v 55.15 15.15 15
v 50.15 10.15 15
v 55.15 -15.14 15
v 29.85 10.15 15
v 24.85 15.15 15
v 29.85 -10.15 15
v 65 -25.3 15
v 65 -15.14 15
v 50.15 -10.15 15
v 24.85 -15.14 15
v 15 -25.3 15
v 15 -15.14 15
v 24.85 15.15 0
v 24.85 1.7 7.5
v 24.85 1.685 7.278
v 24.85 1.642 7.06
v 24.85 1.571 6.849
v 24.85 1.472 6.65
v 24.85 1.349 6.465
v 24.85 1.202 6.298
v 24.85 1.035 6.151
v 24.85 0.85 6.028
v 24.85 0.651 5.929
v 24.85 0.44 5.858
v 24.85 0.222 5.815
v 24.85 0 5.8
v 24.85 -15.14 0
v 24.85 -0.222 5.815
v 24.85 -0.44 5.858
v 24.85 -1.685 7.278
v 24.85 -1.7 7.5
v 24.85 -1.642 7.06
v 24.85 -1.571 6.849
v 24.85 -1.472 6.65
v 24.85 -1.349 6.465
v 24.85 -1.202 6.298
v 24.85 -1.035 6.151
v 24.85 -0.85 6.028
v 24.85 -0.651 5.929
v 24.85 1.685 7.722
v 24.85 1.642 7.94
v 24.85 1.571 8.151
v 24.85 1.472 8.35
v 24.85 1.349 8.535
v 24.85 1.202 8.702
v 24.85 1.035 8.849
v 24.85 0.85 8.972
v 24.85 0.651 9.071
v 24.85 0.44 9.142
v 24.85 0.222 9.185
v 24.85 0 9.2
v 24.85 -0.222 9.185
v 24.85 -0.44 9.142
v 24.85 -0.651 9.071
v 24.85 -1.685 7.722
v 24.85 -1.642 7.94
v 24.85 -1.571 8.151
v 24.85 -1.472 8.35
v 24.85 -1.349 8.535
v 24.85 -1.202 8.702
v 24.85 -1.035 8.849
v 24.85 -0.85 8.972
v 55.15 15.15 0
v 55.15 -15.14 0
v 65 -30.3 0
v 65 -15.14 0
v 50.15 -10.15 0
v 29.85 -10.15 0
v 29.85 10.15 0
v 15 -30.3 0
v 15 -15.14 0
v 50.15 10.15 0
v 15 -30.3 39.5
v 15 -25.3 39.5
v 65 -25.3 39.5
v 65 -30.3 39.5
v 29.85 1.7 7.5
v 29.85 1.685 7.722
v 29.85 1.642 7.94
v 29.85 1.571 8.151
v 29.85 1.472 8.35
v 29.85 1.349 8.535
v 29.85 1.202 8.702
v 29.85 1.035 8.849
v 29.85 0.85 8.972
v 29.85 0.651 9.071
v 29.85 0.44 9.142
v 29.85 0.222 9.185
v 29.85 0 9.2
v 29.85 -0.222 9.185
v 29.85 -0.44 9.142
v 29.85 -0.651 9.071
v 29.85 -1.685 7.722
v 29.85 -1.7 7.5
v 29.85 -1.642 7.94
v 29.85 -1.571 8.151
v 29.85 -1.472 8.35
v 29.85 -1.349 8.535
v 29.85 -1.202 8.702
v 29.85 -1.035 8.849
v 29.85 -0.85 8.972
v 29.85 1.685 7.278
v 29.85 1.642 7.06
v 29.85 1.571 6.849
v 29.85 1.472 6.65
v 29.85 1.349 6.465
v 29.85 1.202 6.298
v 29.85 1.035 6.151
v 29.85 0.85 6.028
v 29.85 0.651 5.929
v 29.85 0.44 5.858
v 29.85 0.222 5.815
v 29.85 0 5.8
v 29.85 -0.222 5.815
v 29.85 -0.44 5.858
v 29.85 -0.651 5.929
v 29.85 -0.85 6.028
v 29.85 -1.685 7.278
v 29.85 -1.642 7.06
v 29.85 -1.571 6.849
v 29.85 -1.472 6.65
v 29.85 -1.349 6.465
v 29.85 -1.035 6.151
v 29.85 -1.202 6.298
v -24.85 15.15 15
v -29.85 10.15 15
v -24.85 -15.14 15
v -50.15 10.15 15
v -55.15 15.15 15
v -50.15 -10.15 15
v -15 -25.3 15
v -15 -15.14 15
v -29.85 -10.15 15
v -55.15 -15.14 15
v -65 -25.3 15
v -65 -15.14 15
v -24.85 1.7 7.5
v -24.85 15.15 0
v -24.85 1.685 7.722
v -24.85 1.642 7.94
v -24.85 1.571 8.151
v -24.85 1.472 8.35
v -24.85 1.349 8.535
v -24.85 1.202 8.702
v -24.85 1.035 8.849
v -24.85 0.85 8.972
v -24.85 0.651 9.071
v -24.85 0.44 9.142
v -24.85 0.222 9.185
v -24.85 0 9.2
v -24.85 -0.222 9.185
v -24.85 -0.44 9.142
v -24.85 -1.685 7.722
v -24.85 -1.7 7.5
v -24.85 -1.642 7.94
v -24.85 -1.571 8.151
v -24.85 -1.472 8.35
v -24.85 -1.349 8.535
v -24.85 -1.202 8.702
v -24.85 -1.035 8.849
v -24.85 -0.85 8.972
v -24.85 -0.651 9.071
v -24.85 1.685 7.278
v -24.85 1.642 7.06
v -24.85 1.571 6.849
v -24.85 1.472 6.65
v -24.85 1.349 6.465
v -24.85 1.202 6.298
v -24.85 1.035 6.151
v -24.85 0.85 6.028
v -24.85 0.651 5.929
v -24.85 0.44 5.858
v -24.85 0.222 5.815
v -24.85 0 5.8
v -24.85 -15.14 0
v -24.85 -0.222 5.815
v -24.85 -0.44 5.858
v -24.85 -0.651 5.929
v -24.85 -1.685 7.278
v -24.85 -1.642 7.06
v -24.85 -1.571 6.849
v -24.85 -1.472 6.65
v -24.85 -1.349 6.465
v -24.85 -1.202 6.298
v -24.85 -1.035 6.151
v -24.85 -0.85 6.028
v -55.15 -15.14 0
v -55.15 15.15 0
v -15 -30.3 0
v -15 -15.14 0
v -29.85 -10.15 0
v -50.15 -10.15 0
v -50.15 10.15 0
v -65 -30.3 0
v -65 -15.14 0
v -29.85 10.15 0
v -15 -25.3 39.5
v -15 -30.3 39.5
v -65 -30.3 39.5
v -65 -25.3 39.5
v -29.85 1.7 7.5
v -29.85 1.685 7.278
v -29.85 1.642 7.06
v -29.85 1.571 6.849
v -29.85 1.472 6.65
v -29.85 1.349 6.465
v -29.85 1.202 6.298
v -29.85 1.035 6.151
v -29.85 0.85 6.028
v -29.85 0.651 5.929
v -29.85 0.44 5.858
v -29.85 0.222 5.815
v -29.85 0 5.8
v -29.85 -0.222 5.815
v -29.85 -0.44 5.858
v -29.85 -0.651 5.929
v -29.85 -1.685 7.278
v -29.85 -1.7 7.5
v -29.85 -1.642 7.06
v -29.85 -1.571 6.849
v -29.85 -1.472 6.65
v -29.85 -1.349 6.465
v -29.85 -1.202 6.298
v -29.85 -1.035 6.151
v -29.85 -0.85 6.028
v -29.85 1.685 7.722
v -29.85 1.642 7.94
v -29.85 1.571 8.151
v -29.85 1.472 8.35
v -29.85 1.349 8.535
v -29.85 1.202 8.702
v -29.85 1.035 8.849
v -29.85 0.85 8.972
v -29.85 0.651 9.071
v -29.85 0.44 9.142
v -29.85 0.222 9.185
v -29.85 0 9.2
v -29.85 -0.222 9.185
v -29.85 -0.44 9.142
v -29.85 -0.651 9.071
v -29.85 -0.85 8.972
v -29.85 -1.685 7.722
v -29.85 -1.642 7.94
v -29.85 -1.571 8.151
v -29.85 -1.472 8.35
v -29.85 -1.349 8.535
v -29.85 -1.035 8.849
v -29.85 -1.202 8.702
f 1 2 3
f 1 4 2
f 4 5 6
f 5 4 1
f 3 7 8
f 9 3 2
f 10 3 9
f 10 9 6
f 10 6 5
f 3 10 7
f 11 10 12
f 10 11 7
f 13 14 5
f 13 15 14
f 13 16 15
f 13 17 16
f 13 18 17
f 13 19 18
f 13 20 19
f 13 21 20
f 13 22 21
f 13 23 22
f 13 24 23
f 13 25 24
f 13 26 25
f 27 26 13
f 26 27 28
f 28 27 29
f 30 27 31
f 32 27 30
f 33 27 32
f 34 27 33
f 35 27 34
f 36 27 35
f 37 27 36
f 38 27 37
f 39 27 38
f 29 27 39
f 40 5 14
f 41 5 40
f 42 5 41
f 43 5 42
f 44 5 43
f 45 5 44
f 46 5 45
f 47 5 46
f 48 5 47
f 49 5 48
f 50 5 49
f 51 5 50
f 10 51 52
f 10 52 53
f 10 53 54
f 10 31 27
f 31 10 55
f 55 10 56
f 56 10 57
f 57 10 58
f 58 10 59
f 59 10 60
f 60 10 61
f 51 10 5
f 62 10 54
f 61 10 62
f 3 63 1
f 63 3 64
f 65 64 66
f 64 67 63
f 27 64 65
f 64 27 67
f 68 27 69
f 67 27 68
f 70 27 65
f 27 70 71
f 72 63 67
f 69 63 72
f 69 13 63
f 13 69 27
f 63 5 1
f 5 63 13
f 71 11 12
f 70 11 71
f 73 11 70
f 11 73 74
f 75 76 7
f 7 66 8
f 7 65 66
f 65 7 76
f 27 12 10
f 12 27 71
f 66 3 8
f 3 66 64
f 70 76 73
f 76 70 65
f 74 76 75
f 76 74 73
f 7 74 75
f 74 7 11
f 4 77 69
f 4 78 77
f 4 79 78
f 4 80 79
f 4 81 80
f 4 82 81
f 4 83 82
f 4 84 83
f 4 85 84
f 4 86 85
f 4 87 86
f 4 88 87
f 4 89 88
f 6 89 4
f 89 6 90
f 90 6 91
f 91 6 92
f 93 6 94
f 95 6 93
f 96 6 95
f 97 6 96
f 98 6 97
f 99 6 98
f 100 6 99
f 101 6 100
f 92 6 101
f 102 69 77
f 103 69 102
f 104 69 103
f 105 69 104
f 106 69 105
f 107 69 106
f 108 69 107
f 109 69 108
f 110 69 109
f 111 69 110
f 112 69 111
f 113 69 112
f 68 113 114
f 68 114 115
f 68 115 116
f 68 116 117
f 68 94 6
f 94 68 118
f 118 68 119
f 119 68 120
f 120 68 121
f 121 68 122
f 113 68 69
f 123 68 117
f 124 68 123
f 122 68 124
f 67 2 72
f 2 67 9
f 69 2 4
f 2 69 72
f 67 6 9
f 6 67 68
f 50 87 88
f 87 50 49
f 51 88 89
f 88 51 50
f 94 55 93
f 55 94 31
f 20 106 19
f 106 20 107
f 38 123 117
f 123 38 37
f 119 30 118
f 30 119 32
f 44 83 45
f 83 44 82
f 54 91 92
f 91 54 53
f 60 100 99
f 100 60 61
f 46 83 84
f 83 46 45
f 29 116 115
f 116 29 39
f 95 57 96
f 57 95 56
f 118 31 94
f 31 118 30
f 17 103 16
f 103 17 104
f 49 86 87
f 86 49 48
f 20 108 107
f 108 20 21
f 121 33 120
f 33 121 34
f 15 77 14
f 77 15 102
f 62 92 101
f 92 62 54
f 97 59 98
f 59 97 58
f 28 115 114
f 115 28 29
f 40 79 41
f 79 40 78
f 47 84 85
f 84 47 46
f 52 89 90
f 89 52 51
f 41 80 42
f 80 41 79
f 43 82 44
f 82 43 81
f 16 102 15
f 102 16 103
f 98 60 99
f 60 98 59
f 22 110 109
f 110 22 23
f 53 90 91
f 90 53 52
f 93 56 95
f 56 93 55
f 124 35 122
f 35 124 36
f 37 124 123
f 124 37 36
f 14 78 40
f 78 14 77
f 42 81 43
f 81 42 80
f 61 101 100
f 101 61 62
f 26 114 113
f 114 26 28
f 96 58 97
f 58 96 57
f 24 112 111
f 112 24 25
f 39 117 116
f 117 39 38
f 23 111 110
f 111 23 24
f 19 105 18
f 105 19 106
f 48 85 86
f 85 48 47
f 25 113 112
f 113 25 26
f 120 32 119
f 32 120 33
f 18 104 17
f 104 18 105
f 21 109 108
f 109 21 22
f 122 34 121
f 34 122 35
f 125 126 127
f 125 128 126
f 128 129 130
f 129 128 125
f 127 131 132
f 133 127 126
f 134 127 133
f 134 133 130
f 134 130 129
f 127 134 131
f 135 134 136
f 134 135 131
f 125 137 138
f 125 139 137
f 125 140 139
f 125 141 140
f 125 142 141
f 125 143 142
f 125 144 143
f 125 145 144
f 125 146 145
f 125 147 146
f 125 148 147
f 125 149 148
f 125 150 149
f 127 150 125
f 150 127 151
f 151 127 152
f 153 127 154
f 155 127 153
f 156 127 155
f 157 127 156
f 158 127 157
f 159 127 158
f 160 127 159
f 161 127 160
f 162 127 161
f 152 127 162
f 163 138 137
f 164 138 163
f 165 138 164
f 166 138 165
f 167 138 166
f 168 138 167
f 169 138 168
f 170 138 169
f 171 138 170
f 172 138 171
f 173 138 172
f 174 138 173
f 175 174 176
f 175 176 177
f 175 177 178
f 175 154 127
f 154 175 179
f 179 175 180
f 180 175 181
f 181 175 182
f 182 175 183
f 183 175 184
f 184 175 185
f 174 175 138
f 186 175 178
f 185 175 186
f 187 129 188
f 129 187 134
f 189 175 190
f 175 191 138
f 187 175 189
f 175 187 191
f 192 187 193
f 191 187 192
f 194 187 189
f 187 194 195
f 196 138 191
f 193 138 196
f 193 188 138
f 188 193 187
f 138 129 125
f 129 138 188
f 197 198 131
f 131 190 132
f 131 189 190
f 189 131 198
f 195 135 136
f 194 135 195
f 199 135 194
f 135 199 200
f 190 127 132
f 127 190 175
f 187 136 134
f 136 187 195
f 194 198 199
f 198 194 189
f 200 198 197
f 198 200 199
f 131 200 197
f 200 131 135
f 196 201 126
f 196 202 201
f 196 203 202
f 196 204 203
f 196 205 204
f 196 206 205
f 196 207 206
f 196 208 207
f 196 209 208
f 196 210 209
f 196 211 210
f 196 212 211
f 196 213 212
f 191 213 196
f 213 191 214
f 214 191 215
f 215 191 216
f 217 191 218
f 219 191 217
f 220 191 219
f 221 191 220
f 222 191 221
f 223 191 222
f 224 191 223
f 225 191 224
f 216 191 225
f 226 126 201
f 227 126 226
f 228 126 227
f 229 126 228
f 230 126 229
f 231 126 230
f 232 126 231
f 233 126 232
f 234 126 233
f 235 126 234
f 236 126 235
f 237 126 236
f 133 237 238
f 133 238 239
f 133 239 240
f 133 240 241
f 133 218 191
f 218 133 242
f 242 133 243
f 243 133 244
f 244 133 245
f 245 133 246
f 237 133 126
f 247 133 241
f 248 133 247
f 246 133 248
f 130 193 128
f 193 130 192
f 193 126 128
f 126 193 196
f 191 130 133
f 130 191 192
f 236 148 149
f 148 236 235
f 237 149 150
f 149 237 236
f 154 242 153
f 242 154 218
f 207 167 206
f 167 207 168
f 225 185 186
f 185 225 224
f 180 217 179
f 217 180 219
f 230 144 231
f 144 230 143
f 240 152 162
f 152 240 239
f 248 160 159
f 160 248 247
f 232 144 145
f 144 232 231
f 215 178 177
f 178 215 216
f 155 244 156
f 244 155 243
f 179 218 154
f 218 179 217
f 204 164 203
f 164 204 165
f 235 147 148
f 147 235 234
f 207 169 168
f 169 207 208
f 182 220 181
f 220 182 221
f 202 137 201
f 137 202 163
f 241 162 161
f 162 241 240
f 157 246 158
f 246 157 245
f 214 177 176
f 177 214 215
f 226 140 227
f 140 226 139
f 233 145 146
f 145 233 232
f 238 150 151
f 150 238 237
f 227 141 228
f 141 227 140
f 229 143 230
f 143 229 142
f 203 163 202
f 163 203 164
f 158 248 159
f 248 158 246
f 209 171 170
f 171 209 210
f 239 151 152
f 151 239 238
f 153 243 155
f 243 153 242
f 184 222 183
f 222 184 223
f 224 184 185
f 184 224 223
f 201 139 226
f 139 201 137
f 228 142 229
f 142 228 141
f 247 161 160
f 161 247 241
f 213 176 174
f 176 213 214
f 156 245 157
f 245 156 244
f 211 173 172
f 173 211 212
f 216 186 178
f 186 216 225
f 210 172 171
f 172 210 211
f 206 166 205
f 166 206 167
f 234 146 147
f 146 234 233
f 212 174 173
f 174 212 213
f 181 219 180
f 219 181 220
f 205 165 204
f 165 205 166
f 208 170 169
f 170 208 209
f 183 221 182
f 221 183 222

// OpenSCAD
// Back rail collar for the bench scope gantry (print one of each hand)
// An open sleeve that slips over the end of the back rail, flush with the end, so the rail still
// seats directly on the gusset. A tall wing wraps onto the upright's BACK face and stops the rail
// rotating around its single 1/4-20 bolt. One M3x10 + T-nut through the top pins it to the rail.
//
// Frame: X along the rail (X=0 is the rail's end, +X is into the upright), Y toward you, Z up.
// Origin: rail centerline = bolt centerline.

/* [Measure these] */
bolt_to_back = 25;    // bolt center to the upright's back face, measured
gusset_t     = 2.5;   // thickness of the gusset between the rail end and the upright, measured

/* [Collar] */
rail        = 20;
fit         = 0.3;    // total clearance on the rail
wall        = 5;      // 5 mm top wall: M3x10 reaches 5 mm into the T-nut
collar_len  = 15;

/* [Wing] */
wing_t      = 5;
wing_half_h = 25;     // above and below the bolt
wrap        = 22;     // how far the wing runs along the upright's back face
back_clear  = 0.3;    // gap between wing and upright

m3_clear = 3.4;
$fn = 48; eps = 0.01;

inner  = rail + fit;
c_half = inner/2 + wall;
y_wing1 = -(bolt_to_back + back_clear);   // wing face that touches the upright
y_wing0 = y_wing1 - wing_t;

module collar(hand = 1) {
  mirror([hand < 0 ? 1 : 0, 0, 0]) difference() {
    union() {
      translate([-collar_len, -c_half, -c_half]) cube([collar_len, 2*c_half, 2*c_half]);                 // sleeve
      translate([-collar_len, y_wing0, -wing_half_h]) cube([collar_len, -c_half - y_wing0 + eps, 2*wing_half_h]);   // web behind the sleeve
      translate([-collar_len, y_wing0, -wing_half_h]) cube([collar_len + gusset_t + wrap, wing_t, 2*wing_half_h]);  // wing
    }
    translate([-collar_len - eps, -inner/2, -inner/2]) cube([collar_len + 2*eps, inner, inner]);          // rail
    translate([-collar_len/2, 0, inner/2 - eps]) cylinder(d = m3_clear, h = wall + 2*eps);                // T-nut screw, top
  }
}

mode = "print";   // "print" | "assembly"
if (mode == "assembly") {
  color("royalblue") collar();
  color("silver") translate([-120, -rail/2, -rail/2]) cube([120, rail, rail]);
  color("gray", 0.6) translate([0, -bolt_to_back, -60]) cube([gusset_t, bolt_to_back + 60, 80]);        // gusset
  color("dimgray", 0.6) translate([gusset_t, -bolt_to_back, -120]) cube([40, 48, 200]);                 // upright
} else {
  // sleeve end down, wing rising: no supports
  for (h = [1, -1]) translate([h*40, 0, 0]) rotate([0, h*-90, 0]) translate([h*collar_len, 0, 0]) collar(h);
}
